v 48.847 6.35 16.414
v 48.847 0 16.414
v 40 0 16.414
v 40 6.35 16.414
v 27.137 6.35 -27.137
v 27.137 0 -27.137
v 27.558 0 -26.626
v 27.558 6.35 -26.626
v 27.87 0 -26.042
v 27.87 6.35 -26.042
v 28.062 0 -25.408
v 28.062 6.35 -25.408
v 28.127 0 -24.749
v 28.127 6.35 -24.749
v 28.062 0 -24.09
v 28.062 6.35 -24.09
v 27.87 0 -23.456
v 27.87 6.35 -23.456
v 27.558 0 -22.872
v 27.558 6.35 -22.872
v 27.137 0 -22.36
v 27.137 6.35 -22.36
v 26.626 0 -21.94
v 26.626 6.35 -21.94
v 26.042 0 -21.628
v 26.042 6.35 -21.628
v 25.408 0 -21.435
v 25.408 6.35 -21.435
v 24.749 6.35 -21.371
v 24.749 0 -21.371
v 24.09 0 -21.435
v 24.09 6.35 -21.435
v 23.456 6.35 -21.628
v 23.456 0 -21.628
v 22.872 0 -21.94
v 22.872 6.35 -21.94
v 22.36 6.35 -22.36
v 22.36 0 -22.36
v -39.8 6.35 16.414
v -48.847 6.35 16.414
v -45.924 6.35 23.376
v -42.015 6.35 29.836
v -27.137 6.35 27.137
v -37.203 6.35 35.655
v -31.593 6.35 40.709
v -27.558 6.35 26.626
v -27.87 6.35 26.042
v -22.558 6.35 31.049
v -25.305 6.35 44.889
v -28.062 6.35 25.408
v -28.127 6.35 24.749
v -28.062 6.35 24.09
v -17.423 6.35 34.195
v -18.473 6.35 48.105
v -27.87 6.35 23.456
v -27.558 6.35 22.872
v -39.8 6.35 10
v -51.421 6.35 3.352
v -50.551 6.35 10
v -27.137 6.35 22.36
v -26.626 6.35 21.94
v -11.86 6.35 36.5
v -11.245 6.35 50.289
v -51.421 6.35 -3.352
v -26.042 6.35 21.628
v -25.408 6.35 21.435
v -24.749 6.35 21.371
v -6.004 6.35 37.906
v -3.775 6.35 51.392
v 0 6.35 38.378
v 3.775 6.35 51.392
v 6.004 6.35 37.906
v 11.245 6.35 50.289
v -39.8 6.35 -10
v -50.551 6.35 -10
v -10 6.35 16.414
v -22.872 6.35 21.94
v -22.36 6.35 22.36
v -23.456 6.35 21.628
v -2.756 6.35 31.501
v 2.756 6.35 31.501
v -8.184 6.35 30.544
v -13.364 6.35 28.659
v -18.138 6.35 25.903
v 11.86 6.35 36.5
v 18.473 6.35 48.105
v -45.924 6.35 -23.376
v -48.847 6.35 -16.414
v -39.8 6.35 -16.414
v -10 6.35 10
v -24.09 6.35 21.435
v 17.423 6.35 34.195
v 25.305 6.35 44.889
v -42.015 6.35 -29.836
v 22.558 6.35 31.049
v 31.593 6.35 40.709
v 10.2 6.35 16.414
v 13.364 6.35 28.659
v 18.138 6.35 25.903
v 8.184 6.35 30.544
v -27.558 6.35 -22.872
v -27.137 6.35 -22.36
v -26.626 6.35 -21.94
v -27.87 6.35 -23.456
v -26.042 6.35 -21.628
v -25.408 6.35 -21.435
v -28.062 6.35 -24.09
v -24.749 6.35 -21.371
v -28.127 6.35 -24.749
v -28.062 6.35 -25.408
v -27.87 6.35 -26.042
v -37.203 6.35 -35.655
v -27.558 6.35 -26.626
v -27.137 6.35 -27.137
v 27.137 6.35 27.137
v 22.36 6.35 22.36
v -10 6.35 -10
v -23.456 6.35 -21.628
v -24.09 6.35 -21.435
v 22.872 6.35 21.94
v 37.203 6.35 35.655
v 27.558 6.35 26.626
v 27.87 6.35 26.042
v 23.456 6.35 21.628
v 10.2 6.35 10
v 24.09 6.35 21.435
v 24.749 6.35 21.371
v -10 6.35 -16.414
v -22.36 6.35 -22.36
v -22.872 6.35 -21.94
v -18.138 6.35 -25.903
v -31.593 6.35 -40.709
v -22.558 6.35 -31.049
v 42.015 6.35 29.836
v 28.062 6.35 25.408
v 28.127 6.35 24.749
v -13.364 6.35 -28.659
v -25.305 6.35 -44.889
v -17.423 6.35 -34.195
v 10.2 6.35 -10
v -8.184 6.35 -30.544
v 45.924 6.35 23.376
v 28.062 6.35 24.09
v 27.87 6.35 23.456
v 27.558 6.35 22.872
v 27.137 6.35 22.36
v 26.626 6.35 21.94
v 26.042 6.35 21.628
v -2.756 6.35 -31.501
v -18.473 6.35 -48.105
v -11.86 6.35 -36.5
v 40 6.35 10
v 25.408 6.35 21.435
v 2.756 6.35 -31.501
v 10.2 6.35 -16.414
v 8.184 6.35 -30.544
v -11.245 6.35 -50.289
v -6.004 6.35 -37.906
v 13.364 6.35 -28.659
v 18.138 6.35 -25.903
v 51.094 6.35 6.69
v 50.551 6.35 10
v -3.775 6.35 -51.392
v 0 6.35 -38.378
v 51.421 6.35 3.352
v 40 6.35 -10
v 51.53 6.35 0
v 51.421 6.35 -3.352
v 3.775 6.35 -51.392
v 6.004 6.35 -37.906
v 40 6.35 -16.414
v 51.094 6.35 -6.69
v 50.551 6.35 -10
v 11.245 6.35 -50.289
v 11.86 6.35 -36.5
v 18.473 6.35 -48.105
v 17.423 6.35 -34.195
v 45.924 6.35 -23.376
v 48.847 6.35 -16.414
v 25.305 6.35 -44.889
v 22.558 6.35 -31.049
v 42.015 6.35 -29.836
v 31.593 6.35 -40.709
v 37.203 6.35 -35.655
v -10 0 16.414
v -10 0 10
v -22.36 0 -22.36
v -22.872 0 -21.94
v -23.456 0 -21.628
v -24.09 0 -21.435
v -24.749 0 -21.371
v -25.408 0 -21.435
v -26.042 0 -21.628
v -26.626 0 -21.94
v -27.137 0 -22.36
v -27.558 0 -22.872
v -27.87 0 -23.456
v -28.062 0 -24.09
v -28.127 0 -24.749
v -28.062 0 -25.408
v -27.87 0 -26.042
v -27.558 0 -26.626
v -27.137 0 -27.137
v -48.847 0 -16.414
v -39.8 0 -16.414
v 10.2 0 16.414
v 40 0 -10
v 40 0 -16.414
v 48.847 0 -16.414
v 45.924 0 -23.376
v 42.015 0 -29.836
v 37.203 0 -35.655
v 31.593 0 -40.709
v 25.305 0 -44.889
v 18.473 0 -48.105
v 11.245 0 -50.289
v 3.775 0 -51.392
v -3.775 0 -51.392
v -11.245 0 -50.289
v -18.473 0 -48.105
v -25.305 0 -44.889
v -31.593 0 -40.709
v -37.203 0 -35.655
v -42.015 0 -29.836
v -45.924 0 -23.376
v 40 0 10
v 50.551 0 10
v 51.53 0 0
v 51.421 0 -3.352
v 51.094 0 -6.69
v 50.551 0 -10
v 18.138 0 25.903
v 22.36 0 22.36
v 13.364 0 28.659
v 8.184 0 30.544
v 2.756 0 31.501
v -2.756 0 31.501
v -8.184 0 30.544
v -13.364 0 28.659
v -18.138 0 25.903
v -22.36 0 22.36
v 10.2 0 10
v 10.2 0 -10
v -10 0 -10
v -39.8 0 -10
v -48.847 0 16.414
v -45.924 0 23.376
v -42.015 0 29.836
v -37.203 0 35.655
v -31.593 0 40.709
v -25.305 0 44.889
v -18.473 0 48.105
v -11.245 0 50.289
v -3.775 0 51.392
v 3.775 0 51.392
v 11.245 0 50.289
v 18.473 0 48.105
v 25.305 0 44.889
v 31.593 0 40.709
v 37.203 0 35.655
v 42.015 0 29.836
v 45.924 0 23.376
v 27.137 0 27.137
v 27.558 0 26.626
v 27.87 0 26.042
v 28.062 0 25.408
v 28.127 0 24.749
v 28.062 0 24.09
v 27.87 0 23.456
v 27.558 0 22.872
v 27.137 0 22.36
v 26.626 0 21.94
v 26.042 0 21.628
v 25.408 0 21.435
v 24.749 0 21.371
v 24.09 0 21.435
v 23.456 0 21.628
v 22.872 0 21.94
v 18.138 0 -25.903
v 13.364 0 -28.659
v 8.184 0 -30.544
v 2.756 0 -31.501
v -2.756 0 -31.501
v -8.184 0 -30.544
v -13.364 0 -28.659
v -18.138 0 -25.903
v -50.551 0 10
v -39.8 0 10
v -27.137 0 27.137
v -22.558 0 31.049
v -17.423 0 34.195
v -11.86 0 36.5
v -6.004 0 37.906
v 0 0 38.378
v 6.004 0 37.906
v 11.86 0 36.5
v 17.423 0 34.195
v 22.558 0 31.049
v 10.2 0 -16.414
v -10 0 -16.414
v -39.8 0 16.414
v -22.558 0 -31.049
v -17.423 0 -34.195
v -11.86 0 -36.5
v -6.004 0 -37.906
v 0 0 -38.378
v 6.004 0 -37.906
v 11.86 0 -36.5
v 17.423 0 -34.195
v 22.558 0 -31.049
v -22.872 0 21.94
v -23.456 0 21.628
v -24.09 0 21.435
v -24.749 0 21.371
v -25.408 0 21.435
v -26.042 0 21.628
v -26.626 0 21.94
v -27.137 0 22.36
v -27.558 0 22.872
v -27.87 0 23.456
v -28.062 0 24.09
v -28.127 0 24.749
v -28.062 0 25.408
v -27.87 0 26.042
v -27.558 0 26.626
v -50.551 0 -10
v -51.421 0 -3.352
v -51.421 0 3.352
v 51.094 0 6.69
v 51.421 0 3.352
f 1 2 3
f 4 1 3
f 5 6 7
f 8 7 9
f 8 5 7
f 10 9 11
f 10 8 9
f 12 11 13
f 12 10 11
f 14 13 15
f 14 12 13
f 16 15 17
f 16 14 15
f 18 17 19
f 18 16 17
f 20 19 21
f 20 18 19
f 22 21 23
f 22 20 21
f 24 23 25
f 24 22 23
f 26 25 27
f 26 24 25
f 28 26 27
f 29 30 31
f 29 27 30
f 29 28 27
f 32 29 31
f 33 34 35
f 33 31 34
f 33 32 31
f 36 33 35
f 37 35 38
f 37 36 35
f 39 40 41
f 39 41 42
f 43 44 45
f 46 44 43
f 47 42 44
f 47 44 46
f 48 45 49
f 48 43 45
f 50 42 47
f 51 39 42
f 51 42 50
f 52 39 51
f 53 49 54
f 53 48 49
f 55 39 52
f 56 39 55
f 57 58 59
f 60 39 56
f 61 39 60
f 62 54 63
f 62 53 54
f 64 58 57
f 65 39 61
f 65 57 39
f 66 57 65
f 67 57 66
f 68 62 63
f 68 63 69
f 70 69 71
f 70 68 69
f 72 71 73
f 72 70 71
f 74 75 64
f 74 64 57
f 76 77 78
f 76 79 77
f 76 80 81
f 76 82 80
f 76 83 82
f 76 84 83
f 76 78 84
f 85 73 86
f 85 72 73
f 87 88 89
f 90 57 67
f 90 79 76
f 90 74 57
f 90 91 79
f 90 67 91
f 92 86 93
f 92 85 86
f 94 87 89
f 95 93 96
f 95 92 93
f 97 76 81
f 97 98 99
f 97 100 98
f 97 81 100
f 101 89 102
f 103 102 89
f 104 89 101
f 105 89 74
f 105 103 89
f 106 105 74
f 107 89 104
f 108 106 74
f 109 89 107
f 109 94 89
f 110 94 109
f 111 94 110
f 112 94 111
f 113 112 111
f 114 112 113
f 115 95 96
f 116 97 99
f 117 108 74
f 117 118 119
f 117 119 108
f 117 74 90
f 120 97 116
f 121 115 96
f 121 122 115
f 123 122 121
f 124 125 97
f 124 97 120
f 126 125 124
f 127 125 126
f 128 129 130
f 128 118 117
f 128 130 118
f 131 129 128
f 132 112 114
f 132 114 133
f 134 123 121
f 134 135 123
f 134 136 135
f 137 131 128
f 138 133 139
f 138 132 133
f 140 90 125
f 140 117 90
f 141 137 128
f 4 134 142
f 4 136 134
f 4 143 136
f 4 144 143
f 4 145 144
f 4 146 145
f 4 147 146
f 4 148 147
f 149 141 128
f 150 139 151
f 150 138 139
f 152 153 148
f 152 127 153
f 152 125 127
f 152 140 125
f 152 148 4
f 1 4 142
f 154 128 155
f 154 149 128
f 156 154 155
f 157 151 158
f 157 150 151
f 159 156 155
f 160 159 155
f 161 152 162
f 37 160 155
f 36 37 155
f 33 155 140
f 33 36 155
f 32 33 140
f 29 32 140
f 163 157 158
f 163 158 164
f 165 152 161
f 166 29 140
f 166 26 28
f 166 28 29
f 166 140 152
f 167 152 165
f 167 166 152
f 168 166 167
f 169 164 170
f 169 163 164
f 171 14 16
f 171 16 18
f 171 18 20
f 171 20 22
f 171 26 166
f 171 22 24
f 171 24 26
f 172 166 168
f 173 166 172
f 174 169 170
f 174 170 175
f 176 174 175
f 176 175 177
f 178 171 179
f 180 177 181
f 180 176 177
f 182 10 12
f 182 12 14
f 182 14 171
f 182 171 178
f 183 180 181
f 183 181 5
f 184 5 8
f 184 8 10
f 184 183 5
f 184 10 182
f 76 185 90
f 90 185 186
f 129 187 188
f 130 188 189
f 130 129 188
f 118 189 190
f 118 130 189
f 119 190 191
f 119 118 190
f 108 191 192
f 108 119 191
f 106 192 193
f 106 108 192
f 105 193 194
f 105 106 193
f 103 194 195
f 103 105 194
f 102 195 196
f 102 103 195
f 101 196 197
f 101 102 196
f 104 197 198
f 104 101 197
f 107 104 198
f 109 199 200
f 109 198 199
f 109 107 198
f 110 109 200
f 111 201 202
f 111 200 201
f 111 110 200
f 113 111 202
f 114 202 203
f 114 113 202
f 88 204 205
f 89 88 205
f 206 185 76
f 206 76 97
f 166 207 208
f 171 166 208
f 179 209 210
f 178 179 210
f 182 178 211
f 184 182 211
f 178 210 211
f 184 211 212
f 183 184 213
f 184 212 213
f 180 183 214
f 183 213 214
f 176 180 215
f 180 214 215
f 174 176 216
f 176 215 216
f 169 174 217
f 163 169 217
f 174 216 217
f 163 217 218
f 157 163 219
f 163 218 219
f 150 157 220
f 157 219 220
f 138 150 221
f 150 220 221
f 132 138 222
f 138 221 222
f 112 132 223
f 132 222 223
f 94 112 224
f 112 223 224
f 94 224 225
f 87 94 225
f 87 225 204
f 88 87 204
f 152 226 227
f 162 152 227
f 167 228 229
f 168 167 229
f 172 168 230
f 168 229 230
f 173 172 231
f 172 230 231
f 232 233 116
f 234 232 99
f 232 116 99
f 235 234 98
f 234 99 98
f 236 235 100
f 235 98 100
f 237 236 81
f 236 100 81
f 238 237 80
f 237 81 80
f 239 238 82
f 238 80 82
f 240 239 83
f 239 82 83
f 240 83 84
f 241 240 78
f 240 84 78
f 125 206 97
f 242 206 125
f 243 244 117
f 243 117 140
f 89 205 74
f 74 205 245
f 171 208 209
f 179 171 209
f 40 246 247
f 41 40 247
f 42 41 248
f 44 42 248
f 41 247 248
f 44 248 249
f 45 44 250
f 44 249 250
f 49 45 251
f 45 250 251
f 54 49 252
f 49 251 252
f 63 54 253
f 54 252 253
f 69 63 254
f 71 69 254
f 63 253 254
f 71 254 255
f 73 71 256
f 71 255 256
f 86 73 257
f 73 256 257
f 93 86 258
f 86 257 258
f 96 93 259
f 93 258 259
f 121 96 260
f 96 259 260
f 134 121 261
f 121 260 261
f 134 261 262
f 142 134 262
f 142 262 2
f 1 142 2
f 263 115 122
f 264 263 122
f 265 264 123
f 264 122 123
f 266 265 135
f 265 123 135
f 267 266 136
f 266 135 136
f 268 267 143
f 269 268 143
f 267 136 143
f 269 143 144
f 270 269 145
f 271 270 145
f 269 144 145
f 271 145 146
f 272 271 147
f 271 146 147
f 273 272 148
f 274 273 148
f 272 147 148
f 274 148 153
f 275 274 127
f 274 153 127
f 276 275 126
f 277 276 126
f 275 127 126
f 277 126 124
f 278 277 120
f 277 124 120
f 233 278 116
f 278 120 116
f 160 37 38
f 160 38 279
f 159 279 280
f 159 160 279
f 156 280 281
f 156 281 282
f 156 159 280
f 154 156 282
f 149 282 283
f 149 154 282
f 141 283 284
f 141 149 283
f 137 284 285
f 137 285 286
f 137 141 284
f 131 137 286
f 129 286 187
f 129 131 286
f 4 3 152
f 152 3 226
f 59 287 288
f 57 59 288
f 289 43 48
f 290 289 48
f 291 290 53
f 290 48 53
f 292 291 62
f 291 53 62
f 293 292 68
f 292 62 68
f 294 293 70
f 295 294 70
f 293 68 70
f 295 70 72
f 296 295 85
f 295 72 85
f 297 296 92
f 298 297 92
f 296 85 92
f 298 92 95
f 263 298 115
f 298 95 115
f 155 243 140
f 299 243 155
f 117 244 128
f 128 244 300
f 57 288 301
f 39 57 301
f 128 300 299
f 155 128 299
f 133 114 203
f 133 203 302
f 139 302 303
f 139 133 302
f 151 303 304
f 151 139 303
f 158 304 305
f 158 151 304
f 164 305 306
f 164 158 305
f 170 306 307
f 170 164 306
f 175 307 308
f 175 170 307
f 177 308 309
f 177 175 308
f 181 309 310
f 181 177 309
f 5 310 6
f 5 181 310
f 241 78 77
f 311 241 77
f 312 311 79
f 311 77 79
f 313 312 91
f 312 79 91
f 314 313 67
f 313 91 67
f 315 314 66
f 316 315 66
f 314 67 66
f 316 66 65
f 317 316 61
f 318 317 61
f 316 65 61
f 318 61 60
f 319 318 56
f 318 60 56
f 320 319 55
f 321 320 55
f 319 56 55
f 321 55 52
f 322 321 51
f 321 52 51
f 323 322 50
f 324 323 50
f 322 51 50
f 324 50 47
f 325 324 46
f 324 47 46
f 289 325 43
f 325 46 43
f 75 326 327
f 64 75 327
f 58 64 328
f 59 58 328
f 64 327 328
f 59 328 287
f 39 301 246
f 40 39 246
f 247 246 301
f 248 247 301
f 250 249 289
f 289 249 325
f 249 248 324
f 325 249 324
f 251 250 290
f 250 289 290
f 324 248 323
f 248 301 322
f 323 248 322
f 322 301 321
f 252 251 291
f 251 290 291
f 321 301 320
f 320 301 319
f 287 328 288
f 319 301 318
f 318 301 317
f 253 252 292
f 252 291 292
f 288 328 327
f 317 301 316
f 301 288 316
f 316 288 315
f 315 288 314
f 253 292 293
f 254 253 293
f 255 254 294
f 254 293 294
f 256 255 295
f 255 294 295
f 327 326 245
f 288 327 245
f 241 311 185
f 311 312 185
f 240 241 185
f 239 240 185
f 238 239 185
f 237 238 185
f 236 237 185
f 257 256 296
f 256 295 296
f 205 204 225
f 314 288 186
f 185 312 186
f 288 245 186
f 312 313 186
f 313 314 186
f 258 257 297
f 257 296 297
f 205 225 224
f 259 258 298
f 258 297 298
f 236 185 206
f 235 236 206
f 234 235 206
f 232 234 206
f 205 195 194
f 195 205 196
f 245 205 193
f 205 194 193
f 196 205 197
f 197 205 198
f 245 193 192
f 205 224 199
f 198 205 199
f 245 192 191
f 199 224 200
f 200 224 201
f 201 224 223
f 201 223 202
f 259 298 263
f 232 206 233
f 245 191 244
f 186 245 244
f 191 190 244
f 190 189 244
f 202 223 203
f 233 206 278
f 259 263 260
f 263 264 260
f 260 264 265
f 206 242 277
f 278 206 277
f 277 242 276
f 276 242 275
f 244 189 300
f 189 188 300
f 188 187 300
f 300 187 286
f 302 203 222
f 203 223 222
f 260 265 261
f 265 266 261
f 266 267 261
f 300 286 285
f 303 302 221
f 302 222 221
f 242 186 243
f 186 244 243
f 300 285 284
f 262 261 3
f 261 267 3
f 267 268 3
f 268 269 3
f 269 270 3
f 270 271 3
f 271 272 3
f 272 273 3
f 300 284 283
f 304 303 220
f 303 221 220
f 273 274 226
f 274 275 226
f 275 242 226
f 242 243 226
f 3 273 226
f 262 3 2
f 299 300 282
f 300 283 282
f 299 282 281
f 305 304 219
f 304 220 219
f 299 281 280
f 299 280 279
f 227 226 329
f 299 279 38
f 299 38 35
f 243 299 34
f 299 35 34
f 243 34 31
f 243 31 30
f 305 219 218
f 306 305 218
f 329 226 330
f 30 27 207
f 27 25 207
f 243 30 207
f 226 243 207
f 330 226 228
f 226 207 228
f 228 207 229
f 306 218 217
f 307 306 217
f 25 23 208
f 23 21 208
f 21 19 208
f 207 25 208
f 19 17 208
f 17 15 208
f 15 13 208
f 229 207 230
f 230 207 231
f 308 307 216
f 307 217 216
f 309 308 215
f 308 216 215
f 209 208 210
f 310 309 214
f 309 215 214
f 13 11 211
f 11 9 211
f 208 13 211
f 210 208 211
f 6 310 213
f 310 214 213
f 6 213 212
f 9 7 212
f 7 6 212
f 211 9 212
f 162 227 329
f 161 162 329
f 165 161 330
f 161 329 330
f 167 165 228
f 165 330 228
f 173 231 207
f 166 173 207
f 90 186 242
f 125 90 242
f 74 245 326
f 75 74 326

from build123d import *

# Parameters (mm, degrees)
SKETCH1_W           = 20.2
SKETCH1_H           = 6.4135
BOSS_EXTRUDE1_DEPTH = 6.35
CUT_EXTRUDE1_DEPTH  = 7.35


with BuildPart() as part:
    # Sketch1 → Boss-Extrude1 (new body)
    with BuildSketch(Plane(origin=(0, 0, 0), x_dir=(1, 0, 0), z_dir=(0, 1, 0))):
        with BuildLine():
            ThreePointArc((48.846590956, 16.4135), (0, 51.5305), (-48.846590956, 16.4135))
            Line((-48.846590956, 16.4135), (-39.8, 16.4135))
            Line((-39.8, 16.4135), (-39.8, 10))
            Line((-39.8, 10), (-50.55088951, 10))
            ThreePointArc((-50.55088951, 10), (-51.5305, 0), (-50.55088951, -10))
            Line((-50.55088951, -10), (-39.8, -10))
            Line((-39.8, -10), (-39.8, -16.4135))
            Line((-39.8, -16.4135), (-48.846590956, -16.4135))
            ThreePointArc((-48.846590956, -16.4135), (0, -51.5305), (48.846590956, -16.4135))
            Line((48.846590956, -16.4135), (40, -16.4135))
            Line((40, -16.4135), (40, -10))
            Line((40, -10), (50.55088951, -10))
            ThreePointArc((50.55088951, -10), (51.285012636, -5.023933636), (51.5305, 0))
            ThreePointArc((51.5305, 0), (51.285012636, 5.023933636), (50.55088951, 10))
            Line((50.55088951, 10), (40, 10))
            Line((40, 10), (40, 16.4135))
            Line((40, 16.4135), (48.846590956, 16.4135))
        make_face()
        with Locations((0.1, -13.20675)):
            Rectangle(SKETCH1_W, SKETCH1_H, mode=Mode.SUBTRACT)
        with Locations((0.1, 13.20675)):
            Rectangle(SKETCH1_W, SKETCH1_H, mode=Mode.SUBTRACT)
    extrude(amount=BOSS_EXTRUDE1_DEPTH)

    # Sketch2 → Cut-Extrude1 (cut, through all)
    with BuildSketch(Plane(origin=(0, 6.35, 0), x_dir=(1, 0, 0), z_dir=(0, 1, 0))):
        with BuildLine():
            ThreePointArc((-27.13748547, -27.13748547), (0, -38.3782), (27.13748547, -27.13748547))
            ThreePointArc((27.13748547, -27.13748547), (27.13748547, -22.359989213), (22.359989213, -22.359989213))
            ThreePointArc((22.359989213, -22.359989213), (0, -31.6218), (-22.359989213, -22.359989213))
            ThreePointArc((-22.359989213, -22.359989213), (-27.13748547, -22.359989213), (-27.13748547, -27.13748547))
        make_face()
        with BuildLine():
            ThreePointArc((-27.13748547, 27.13748547), (0, 38.3782), (27.13748547, 27.13748547))
            ThreePointArc((27.13748547, 27.13748547), (27.13748547, 22.359989213), (22.359989213, 22.359989213))
            ThreePointArc((22.359989213, 22.359989213), (0, 31.6218), (-22.359989213, 22.359989213))
            ThreePointArc((-22.359989213, 22.359989213), (-27.13748547, 22.359989213), (-27.13748547, 27.13748547))
        make_face()
    extrude(amount=-CUT_EXTRUDE1_DEPTH, mode=Mode.SUBTRACT)


solid = part.part
